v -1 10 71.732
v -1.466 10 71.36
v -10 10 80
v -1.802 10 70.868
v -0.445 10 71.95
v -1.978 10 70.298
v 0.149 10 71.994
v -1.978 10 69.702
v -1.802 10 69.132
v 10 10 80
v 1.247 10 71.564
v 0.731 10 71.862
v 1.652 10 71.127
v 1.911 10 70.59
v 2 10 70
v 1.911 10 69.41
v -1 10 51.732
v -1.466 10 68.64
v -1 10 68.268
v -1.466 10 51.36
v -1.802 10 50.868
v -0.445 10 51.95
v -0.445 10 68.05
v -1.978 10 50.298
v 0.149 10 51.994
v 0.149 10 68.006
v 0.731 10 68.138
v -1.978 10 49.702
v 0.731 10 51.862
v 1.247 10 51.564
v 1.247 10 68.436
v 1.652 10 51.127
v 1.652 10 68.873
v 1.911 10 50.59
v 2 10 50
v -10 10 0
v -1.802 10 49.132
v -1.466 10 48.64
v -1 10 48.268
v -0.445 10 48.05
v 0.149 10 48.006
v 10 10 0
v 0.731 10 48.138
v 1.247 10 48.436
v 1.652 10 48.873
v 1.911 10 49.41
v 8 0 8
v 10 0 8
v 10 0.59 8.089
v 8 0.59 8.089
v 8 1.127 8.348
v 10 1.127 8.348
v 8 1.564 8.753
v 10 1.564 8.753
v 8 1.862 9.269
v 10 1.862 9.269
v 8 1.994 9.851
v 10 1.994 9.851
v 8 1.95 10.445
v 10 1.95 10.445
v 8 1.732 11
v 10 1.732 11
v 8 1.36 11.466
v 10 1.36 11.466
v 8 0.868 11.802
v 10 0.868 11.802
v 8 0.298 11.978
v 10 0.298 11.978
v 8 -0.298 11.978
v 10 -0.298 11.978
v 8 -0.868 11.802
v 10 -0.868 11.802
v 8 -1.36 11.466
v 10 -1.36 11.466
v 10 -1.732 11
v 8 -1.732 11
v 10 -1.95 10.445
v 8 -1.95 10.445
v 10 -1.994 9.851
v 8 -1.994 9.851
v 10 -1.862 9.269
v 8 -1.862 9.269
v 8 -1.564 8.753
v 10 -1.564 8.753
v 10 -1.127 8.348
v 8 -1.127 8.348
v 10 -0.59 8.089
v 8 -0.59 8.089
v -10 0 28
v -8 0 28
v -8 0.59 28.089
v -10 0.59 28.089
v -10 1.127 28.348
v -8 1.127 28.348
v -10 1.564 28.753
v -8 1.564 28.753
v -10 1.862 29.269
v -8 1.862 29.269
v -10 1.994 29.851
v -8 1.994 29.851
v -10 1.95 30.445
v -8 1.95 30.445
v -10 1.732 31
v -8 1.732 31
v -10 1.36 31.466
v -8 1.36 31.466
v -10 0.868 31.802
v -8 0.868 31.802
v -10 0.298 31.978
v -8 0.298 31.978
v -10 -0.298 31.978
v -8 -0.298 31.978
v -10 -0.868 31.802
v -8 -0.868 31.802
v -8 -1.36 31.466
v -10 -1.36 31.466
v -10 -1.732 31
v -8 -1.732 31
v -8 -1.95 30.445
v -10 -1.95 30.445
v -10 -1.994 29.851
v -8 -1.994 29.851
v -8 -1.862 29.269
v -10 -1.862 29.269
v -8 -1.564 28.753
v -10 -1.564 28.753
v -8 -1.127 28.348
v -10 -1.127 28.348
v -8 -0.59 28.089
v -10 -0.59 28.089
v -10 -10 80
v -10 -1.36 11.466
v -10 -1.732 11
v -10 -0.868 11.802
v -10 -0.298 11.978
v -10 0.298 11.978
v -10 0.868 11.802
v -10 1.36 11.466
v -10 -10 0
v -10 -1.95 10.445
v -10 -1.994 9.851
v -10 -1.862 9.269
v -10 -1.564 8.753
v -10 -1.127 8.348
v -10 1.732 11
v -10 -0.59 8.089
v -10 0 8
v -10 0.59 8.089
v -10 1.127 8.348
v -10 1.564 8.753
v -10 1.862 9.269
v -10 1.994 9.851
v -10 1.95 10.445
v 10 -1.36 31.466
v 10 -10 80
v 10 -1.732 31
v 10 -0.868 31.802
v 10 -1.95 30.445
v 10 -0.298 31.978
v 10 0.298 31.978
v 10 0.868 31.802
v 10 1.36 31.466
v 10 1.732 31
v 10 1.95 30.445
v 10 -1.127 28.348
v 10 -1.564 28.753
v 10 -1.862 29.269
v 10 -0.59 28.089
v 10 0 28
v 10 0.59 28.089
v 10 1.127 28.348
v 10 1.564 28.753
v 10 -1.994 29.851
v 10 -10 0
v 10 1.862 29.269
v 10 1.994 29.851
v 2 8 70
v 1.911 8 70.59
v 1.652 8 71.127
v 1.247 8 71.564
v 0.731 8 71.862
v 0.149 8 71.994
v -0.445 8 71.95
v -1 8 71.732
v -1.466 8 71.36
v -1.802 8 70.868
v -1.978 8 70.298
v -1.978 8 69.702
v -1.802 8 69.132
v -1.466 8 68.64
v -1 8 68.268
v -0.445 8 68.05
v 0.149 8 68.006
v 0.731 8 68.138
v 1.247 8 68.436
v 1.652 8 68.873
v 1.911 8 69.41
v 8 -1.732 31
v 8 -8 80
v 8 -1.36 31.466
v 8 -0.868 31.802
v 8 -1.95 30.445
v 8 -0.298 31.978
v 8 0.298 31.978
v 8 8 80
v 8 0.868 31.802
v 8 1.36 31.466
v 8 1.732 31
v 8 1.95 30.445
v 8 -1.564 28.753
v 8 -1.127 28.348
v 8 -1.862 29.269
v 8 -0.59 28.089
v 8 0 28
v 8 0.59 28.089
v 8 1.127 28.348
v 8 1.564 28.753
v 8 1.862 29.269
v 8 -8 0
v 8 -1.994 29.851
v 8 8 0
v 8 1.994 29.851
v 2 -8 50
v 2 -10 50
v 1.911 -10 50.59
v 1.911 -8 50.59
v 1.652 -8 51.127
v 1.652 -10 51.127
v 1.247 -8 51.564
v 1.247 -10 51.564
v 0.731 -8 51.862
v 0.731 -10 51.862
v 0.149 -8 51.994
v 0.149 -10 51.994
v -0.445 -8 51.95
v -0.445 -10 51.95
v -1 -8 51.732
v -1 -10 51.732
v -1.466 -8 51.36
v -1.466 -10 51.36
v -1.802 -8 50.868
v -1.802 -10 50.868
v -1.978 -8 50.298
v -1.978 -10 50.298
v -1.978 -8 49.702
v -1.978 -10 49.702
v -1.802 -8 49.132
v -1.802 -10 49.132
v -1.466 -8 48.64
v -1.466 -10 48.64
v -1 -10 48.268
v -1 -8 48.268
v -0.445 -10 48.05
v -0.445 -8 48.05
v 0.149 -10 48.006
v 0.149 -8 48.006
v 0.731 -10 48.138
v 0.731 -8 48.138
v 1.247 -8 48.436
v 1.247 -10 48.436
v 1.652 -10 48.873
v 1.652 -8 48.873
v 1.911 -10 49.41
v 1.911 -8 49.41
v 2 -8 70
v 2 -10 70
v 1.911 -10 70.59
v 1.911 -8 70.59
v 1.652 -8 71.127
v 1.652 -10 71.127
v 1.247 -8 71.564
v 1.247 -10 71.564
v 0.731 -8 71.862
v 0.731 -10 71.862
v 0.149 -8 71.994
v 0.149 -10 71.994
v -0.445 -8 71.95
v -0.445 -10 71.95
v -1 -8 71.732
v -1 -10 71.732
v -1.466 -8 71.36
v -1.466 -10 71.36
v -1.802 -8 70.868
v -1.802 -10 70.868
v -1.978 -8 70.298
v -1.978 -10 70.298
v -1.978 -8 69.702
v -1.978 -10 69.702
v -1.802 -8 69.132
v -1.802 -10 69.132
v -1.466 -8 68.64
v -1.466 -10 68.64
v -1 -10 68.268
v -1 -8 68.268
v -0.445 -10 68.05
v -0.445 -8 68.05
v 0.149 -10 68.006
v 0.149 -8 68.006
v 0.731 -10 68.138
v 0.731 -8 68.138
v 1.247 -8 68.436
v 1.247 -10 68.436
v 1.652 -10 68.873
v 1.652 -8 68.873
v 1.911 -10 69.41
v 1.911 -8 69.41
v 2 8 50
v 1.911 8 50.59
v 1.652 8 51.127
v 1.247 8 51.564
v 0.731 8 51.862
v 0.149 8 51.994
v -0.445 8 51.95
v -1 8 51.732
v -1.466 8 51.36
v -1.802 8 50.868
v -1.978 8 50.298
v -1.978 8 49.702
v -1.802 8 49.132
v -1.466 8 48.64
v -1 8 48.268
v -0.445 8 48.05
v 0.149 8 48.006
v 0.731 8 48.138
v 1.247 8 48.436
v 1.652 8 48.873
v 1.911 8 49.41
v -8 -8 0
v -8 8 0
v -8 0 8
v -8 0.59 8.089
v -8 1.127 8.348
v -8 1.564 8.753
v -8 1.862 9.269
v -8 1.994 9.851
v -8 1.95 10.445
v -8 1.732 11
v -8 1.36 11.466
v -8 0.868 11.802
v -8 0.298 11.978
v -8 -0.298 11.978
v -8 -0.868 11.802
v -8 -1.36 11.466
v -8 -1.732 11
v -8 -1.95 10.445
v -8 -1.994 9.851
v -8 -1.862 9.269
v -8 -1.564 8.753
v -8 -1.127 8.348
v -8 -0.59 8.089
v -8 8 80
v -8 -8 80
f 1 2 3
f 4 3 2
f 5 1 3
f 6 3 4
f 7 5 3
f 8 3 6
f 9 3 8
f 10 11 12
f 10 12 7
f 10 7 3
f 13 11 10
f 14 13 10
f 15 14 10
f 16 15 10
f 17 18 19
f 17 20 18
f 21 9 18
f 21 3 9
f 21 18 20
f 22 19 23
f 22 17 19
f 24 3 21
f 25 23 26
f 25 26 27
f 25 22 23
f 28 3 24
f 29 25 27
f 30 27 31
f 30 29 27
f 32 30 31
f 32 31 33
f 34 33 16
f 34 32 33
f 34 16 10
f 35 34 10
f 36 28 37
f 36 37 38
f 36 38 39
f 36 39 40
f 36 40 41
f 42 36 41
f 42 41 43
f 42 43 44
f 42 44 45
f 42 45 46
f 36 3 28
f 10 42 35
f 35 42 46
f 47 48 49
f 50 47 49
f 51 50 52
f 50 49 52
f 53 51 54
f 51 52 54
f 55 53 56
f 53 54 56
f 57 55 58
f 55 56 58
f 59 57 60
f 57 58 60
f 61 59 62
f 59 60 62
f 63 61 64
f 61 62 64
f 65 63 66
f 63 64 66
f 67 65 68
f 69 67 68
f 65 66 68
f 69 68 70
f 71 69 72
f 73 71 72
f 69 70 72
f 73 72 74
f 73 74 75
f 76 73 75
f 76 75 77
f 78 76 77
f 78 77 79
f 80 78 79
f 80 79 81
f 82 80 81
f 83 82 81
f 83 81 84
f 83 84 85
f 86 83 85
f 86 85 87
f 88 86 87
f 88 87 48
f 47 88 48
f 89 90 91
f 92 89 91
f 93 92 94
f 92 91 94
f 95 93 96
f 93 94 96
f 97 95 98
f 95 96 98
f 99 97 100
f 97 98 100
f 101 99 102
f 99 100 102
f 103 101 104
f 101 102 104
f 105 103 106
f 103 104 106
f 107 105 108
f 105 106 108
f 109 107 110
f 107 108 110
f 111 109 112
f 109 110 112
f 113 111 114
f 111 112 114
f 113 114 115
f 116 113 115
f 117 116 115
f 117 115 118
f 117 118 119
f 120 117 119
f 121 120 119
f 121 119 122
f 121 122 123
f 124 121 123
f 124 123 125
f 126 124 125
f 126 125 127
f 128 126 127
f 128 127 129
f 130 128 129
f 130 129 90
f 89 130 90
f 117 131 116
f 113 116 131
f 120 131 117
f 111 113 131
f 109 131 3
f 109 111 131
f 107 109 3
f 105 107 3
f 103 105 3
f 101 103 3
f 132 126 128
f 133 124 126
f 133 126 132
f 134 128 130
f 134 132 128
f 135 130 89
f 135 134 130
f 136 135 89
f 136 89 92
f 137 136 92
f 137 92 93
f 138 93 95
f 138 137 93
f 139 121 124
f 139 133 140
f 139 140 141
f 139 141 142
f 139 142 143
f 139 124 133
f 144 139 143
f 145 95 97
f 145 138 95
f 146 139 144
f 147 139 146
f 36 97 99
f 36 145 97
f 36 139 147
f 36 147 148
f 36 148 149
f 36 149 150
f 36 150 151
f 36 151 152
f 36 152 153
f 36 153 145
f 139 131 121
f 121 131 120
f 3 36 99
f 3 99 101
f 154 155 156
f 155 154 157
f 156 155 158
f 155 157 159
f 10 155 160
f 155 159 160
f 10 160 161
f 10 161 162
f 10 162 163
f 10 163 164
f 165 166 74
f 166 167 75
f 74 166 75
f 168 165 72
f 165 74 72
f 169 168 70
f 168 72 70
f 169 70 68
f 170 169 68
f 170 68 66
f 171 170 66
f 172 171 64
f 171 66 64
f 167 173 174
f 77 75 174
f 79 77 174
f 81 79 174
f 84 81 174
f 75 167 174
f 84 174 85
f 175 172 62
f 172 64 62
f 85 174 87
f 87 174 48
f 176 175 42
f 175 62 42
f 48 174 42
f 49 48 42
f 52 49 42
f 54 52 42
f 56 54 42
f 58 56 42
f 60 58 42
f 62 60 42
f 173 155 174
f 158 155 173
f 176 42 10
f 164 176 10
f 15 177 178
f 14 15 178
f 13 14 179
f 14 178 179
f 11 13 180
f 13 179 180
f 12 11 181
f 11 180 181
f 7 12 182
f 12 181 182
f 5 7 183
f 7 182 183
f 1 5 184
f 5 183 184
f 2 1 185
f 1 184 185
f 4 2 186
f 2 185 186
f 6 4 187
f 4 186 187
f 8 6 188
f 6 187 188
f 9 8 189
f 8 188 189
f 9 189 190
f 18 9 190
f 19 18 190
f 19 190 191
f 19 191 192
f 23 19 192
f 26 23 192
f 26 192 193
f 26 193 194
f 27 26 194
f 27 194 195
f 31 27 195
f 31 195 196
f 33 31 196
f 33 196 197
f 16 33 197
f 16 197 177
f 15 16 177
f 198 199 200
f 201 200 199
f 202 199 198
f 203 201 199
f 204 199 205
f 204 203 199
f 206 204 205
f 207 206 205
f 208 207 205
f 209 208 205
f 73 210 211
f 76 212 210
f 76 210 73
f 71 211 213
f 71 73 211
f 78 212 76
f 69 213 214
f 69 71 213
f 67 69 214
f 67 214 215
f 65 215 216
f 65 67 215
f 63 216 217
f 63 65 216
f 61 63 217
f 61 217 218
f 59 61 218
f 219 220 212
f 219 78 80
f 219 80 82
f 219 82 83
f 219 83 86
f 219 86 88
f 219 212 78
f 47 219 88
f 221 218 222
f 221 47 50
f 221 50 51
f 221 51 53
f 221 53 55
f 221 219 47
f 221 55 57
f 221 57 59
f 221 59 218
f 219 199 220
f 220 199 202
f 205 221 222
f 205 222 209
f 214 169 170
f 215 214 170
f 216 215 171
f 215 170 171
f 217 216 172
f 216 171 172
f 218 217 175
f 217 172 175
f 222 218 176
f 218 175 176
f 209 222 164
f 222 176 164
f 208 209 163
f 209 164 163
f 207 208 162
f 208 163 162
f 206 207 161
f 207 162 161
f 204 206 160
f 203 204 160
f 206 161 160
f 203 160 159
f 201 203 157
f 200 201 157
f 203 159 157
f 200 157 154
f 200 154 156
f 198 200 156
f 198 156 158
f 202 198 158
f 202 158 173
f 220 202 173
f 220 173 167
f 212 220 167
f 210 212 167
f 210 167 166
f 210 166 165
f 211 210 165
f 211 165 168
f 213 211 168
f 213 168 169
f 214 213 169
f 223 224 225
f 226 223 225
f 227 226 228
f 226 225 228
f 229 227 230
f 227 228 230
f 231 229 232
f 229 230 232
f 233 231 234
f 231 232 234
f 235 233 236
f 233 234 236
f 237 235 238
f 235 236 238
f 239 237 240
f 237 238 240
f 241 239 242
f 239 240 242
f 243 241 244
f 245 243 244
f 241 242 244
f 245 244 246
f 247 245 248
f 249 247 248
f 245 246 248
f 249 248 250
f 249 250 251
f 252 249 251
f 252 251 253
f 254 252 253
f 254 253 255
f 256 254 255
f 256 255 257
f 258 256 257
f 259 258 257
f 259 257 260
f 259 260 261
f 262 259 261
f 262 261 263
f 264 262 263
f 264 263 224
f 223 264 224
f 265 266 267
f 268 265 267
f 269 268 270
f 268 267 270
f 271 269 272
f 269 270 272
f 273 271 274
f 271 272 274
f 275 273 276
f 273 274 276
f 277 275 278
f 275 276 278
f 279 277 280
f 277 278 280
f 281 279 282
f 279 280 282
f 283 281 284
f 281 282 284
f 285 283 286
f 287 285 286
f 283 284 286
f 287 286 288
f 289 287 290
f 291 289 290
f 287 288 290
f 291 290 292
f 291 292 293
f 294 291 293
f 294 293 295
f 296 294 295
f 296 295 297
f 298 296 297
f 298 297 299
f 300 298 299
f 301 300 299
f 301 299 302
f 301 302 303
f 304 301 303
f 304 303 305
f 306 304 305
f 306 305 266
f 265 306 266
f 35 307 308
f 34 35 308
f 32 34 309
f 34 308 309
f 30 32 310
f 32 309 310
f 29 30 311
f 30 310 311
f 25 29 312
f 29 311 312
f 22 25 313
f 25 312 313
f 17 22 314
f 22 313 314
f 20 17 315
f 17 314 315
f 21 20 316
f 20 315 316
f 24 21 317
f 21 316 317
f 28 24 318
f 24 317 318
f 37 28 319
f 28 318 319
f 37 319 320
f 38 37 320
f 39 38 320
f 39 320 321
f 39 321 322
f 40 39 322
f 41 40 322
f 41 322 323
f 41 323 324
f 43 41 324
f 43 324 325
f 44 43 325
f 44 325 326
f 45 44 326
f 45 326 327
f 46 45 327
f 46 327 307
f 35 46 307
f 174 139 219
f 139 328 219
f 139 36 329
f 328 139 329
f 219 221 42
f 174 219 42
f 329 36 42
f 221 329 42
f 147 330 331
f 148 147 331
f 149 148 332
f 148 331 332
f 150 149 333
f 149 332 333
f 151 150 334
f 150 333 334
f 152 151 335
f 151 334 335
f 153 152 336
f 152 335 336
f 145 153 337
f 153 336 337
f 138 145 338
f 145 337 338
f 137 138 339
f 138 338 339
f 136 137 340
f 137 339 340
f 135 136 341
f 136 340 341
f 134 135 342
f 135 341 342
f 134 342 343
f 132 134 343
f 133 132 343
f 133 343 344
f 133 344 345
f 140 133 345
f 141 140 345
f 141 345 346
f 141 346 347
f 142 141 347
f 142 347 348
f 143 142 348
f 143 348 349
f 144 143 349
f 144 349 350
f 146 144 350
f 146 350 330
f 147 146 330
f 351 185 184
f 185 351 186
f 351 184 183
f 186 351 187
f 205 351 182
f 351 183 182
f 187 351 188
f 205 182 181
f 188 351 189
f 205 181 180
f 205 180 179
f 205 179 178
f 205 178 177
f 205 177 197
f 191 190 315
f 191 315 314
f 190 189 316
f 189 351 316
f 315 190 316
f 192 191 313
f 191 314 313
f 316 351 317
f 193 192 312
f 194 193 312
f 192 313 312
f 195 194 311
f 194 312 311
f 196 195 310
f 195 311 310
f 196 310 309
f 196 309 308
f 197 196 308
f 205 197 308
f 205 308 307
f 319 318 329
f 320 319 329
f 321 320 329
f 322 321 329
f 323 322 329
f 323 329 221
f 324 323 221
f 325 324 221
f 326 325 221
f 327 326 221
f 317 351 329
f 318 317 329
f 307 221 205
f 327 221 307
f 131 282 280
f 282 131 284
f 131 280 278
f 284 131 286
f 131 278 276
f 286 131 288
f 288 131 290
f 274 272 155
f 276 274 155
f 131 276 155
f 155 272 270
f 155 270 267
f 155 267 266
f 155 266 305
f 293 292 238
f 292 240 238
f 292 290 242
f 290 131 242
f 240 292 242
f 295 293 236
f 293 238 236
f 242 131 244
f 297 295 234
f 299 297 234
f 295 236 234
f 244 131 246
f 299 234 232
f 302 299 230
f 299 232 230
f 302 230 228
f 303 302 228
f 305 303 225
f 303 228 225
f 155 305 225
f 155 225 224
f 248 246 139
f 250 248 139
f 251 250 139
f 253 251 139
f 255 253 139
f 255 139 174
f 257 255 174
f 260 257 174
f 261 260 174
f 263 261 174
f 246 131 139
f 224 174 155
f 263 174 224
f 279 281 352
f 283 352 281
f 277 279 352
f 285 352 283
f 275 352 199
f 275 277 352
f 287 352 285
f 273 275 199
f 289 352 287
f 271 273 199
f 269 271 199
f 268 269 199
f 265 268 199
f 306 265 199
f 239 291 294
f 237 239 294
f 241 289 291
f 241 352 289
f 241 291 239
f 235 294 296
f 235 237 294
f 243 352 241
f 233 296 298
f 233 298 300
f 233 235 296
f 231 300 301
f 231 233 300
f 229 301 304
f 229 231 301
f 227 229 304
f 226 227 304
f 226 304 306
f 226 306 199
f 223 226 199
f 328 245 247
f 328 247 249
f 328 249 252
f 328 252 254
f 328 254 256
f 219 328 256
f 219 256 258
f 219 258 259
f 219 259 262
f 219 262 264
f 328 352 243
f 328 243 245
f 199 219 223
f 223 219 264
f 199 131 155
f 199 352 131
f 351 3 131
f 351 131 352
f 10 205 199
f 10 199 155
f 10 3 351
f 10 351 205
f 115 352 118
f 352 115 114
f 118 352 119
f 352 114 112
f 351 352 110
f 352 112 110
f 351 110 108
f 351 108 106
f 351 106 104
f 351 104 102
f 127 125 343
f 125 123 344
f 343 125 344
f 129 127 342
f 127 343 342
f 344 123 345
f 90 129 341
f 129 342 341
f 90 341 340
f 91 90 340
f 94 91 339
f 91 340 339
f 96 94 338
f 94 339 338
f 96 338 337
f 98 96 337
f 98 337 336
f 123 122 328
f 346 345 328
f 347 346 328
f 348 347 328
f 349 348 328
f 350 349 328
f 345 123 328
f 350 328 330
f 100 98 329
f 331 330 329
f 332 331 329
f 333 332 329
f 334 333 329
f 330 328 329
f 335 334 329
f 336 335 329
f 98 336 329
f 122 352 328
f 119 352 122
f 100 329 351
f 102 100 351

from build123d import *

# Parameters (mm, degrees)
SKETCH_1_W          = 20
SKETCH_1_H          = 20
SKETCH_1_W_2        = 16
SKETCH_1_H_2        = 16
EXTRUDE_1_DEPTH     = 80
SKETCH_2_R          = 2
CUT_EXTRUDE_1_DEPTH = 100
SKETCH_3_R          = 2
CUT_EXTRUDE_2_DEPTH = 100


with BuildPart() as part:
    # 草图1 → 凸台-拉伸1 (new body)
    with BuildSketch(Plane.XY):
        Rectangle(SKETCH_1_W, SKETCH_1_H)
        Rectangle(SKETCH_1_W_2, SKETCH_1_H_2, mode=Mode.SUBTRACT)
    extrude(amount=EXTRUDE_1_DEPTH)

    # 草图2 → 切除-拉伸1 (cut)
    with BuildSketch(Plane(origin=(10, 0, 0), x_dir=(0, 0, -1), z_dir=(1, 0, 0))):
        with Locations((-10, 0)):
            Circle(SKETCH_2_R)
        with Locations((-30, 0)):
            Circle(SKETCH_2_R)
    extrude(amount=-CUT_EXTRUDE_1_DEPTH, mode=Mode.SUBTRACT)

    # 草图3 → 切除-拉伸2 (cut)
    with BuildSketch(Plane.XZ.offset(10)):
        with Locations((0, 50)):
            Circle(SKETCH_3_R)
        with Locations((0, 70)):
            Circle(SKETCH_3_R)
    extrude(amount=-CUT_EXTRUDE_2_DEPTH, mode=Mode.SUBTRACT)


solid = part.part
